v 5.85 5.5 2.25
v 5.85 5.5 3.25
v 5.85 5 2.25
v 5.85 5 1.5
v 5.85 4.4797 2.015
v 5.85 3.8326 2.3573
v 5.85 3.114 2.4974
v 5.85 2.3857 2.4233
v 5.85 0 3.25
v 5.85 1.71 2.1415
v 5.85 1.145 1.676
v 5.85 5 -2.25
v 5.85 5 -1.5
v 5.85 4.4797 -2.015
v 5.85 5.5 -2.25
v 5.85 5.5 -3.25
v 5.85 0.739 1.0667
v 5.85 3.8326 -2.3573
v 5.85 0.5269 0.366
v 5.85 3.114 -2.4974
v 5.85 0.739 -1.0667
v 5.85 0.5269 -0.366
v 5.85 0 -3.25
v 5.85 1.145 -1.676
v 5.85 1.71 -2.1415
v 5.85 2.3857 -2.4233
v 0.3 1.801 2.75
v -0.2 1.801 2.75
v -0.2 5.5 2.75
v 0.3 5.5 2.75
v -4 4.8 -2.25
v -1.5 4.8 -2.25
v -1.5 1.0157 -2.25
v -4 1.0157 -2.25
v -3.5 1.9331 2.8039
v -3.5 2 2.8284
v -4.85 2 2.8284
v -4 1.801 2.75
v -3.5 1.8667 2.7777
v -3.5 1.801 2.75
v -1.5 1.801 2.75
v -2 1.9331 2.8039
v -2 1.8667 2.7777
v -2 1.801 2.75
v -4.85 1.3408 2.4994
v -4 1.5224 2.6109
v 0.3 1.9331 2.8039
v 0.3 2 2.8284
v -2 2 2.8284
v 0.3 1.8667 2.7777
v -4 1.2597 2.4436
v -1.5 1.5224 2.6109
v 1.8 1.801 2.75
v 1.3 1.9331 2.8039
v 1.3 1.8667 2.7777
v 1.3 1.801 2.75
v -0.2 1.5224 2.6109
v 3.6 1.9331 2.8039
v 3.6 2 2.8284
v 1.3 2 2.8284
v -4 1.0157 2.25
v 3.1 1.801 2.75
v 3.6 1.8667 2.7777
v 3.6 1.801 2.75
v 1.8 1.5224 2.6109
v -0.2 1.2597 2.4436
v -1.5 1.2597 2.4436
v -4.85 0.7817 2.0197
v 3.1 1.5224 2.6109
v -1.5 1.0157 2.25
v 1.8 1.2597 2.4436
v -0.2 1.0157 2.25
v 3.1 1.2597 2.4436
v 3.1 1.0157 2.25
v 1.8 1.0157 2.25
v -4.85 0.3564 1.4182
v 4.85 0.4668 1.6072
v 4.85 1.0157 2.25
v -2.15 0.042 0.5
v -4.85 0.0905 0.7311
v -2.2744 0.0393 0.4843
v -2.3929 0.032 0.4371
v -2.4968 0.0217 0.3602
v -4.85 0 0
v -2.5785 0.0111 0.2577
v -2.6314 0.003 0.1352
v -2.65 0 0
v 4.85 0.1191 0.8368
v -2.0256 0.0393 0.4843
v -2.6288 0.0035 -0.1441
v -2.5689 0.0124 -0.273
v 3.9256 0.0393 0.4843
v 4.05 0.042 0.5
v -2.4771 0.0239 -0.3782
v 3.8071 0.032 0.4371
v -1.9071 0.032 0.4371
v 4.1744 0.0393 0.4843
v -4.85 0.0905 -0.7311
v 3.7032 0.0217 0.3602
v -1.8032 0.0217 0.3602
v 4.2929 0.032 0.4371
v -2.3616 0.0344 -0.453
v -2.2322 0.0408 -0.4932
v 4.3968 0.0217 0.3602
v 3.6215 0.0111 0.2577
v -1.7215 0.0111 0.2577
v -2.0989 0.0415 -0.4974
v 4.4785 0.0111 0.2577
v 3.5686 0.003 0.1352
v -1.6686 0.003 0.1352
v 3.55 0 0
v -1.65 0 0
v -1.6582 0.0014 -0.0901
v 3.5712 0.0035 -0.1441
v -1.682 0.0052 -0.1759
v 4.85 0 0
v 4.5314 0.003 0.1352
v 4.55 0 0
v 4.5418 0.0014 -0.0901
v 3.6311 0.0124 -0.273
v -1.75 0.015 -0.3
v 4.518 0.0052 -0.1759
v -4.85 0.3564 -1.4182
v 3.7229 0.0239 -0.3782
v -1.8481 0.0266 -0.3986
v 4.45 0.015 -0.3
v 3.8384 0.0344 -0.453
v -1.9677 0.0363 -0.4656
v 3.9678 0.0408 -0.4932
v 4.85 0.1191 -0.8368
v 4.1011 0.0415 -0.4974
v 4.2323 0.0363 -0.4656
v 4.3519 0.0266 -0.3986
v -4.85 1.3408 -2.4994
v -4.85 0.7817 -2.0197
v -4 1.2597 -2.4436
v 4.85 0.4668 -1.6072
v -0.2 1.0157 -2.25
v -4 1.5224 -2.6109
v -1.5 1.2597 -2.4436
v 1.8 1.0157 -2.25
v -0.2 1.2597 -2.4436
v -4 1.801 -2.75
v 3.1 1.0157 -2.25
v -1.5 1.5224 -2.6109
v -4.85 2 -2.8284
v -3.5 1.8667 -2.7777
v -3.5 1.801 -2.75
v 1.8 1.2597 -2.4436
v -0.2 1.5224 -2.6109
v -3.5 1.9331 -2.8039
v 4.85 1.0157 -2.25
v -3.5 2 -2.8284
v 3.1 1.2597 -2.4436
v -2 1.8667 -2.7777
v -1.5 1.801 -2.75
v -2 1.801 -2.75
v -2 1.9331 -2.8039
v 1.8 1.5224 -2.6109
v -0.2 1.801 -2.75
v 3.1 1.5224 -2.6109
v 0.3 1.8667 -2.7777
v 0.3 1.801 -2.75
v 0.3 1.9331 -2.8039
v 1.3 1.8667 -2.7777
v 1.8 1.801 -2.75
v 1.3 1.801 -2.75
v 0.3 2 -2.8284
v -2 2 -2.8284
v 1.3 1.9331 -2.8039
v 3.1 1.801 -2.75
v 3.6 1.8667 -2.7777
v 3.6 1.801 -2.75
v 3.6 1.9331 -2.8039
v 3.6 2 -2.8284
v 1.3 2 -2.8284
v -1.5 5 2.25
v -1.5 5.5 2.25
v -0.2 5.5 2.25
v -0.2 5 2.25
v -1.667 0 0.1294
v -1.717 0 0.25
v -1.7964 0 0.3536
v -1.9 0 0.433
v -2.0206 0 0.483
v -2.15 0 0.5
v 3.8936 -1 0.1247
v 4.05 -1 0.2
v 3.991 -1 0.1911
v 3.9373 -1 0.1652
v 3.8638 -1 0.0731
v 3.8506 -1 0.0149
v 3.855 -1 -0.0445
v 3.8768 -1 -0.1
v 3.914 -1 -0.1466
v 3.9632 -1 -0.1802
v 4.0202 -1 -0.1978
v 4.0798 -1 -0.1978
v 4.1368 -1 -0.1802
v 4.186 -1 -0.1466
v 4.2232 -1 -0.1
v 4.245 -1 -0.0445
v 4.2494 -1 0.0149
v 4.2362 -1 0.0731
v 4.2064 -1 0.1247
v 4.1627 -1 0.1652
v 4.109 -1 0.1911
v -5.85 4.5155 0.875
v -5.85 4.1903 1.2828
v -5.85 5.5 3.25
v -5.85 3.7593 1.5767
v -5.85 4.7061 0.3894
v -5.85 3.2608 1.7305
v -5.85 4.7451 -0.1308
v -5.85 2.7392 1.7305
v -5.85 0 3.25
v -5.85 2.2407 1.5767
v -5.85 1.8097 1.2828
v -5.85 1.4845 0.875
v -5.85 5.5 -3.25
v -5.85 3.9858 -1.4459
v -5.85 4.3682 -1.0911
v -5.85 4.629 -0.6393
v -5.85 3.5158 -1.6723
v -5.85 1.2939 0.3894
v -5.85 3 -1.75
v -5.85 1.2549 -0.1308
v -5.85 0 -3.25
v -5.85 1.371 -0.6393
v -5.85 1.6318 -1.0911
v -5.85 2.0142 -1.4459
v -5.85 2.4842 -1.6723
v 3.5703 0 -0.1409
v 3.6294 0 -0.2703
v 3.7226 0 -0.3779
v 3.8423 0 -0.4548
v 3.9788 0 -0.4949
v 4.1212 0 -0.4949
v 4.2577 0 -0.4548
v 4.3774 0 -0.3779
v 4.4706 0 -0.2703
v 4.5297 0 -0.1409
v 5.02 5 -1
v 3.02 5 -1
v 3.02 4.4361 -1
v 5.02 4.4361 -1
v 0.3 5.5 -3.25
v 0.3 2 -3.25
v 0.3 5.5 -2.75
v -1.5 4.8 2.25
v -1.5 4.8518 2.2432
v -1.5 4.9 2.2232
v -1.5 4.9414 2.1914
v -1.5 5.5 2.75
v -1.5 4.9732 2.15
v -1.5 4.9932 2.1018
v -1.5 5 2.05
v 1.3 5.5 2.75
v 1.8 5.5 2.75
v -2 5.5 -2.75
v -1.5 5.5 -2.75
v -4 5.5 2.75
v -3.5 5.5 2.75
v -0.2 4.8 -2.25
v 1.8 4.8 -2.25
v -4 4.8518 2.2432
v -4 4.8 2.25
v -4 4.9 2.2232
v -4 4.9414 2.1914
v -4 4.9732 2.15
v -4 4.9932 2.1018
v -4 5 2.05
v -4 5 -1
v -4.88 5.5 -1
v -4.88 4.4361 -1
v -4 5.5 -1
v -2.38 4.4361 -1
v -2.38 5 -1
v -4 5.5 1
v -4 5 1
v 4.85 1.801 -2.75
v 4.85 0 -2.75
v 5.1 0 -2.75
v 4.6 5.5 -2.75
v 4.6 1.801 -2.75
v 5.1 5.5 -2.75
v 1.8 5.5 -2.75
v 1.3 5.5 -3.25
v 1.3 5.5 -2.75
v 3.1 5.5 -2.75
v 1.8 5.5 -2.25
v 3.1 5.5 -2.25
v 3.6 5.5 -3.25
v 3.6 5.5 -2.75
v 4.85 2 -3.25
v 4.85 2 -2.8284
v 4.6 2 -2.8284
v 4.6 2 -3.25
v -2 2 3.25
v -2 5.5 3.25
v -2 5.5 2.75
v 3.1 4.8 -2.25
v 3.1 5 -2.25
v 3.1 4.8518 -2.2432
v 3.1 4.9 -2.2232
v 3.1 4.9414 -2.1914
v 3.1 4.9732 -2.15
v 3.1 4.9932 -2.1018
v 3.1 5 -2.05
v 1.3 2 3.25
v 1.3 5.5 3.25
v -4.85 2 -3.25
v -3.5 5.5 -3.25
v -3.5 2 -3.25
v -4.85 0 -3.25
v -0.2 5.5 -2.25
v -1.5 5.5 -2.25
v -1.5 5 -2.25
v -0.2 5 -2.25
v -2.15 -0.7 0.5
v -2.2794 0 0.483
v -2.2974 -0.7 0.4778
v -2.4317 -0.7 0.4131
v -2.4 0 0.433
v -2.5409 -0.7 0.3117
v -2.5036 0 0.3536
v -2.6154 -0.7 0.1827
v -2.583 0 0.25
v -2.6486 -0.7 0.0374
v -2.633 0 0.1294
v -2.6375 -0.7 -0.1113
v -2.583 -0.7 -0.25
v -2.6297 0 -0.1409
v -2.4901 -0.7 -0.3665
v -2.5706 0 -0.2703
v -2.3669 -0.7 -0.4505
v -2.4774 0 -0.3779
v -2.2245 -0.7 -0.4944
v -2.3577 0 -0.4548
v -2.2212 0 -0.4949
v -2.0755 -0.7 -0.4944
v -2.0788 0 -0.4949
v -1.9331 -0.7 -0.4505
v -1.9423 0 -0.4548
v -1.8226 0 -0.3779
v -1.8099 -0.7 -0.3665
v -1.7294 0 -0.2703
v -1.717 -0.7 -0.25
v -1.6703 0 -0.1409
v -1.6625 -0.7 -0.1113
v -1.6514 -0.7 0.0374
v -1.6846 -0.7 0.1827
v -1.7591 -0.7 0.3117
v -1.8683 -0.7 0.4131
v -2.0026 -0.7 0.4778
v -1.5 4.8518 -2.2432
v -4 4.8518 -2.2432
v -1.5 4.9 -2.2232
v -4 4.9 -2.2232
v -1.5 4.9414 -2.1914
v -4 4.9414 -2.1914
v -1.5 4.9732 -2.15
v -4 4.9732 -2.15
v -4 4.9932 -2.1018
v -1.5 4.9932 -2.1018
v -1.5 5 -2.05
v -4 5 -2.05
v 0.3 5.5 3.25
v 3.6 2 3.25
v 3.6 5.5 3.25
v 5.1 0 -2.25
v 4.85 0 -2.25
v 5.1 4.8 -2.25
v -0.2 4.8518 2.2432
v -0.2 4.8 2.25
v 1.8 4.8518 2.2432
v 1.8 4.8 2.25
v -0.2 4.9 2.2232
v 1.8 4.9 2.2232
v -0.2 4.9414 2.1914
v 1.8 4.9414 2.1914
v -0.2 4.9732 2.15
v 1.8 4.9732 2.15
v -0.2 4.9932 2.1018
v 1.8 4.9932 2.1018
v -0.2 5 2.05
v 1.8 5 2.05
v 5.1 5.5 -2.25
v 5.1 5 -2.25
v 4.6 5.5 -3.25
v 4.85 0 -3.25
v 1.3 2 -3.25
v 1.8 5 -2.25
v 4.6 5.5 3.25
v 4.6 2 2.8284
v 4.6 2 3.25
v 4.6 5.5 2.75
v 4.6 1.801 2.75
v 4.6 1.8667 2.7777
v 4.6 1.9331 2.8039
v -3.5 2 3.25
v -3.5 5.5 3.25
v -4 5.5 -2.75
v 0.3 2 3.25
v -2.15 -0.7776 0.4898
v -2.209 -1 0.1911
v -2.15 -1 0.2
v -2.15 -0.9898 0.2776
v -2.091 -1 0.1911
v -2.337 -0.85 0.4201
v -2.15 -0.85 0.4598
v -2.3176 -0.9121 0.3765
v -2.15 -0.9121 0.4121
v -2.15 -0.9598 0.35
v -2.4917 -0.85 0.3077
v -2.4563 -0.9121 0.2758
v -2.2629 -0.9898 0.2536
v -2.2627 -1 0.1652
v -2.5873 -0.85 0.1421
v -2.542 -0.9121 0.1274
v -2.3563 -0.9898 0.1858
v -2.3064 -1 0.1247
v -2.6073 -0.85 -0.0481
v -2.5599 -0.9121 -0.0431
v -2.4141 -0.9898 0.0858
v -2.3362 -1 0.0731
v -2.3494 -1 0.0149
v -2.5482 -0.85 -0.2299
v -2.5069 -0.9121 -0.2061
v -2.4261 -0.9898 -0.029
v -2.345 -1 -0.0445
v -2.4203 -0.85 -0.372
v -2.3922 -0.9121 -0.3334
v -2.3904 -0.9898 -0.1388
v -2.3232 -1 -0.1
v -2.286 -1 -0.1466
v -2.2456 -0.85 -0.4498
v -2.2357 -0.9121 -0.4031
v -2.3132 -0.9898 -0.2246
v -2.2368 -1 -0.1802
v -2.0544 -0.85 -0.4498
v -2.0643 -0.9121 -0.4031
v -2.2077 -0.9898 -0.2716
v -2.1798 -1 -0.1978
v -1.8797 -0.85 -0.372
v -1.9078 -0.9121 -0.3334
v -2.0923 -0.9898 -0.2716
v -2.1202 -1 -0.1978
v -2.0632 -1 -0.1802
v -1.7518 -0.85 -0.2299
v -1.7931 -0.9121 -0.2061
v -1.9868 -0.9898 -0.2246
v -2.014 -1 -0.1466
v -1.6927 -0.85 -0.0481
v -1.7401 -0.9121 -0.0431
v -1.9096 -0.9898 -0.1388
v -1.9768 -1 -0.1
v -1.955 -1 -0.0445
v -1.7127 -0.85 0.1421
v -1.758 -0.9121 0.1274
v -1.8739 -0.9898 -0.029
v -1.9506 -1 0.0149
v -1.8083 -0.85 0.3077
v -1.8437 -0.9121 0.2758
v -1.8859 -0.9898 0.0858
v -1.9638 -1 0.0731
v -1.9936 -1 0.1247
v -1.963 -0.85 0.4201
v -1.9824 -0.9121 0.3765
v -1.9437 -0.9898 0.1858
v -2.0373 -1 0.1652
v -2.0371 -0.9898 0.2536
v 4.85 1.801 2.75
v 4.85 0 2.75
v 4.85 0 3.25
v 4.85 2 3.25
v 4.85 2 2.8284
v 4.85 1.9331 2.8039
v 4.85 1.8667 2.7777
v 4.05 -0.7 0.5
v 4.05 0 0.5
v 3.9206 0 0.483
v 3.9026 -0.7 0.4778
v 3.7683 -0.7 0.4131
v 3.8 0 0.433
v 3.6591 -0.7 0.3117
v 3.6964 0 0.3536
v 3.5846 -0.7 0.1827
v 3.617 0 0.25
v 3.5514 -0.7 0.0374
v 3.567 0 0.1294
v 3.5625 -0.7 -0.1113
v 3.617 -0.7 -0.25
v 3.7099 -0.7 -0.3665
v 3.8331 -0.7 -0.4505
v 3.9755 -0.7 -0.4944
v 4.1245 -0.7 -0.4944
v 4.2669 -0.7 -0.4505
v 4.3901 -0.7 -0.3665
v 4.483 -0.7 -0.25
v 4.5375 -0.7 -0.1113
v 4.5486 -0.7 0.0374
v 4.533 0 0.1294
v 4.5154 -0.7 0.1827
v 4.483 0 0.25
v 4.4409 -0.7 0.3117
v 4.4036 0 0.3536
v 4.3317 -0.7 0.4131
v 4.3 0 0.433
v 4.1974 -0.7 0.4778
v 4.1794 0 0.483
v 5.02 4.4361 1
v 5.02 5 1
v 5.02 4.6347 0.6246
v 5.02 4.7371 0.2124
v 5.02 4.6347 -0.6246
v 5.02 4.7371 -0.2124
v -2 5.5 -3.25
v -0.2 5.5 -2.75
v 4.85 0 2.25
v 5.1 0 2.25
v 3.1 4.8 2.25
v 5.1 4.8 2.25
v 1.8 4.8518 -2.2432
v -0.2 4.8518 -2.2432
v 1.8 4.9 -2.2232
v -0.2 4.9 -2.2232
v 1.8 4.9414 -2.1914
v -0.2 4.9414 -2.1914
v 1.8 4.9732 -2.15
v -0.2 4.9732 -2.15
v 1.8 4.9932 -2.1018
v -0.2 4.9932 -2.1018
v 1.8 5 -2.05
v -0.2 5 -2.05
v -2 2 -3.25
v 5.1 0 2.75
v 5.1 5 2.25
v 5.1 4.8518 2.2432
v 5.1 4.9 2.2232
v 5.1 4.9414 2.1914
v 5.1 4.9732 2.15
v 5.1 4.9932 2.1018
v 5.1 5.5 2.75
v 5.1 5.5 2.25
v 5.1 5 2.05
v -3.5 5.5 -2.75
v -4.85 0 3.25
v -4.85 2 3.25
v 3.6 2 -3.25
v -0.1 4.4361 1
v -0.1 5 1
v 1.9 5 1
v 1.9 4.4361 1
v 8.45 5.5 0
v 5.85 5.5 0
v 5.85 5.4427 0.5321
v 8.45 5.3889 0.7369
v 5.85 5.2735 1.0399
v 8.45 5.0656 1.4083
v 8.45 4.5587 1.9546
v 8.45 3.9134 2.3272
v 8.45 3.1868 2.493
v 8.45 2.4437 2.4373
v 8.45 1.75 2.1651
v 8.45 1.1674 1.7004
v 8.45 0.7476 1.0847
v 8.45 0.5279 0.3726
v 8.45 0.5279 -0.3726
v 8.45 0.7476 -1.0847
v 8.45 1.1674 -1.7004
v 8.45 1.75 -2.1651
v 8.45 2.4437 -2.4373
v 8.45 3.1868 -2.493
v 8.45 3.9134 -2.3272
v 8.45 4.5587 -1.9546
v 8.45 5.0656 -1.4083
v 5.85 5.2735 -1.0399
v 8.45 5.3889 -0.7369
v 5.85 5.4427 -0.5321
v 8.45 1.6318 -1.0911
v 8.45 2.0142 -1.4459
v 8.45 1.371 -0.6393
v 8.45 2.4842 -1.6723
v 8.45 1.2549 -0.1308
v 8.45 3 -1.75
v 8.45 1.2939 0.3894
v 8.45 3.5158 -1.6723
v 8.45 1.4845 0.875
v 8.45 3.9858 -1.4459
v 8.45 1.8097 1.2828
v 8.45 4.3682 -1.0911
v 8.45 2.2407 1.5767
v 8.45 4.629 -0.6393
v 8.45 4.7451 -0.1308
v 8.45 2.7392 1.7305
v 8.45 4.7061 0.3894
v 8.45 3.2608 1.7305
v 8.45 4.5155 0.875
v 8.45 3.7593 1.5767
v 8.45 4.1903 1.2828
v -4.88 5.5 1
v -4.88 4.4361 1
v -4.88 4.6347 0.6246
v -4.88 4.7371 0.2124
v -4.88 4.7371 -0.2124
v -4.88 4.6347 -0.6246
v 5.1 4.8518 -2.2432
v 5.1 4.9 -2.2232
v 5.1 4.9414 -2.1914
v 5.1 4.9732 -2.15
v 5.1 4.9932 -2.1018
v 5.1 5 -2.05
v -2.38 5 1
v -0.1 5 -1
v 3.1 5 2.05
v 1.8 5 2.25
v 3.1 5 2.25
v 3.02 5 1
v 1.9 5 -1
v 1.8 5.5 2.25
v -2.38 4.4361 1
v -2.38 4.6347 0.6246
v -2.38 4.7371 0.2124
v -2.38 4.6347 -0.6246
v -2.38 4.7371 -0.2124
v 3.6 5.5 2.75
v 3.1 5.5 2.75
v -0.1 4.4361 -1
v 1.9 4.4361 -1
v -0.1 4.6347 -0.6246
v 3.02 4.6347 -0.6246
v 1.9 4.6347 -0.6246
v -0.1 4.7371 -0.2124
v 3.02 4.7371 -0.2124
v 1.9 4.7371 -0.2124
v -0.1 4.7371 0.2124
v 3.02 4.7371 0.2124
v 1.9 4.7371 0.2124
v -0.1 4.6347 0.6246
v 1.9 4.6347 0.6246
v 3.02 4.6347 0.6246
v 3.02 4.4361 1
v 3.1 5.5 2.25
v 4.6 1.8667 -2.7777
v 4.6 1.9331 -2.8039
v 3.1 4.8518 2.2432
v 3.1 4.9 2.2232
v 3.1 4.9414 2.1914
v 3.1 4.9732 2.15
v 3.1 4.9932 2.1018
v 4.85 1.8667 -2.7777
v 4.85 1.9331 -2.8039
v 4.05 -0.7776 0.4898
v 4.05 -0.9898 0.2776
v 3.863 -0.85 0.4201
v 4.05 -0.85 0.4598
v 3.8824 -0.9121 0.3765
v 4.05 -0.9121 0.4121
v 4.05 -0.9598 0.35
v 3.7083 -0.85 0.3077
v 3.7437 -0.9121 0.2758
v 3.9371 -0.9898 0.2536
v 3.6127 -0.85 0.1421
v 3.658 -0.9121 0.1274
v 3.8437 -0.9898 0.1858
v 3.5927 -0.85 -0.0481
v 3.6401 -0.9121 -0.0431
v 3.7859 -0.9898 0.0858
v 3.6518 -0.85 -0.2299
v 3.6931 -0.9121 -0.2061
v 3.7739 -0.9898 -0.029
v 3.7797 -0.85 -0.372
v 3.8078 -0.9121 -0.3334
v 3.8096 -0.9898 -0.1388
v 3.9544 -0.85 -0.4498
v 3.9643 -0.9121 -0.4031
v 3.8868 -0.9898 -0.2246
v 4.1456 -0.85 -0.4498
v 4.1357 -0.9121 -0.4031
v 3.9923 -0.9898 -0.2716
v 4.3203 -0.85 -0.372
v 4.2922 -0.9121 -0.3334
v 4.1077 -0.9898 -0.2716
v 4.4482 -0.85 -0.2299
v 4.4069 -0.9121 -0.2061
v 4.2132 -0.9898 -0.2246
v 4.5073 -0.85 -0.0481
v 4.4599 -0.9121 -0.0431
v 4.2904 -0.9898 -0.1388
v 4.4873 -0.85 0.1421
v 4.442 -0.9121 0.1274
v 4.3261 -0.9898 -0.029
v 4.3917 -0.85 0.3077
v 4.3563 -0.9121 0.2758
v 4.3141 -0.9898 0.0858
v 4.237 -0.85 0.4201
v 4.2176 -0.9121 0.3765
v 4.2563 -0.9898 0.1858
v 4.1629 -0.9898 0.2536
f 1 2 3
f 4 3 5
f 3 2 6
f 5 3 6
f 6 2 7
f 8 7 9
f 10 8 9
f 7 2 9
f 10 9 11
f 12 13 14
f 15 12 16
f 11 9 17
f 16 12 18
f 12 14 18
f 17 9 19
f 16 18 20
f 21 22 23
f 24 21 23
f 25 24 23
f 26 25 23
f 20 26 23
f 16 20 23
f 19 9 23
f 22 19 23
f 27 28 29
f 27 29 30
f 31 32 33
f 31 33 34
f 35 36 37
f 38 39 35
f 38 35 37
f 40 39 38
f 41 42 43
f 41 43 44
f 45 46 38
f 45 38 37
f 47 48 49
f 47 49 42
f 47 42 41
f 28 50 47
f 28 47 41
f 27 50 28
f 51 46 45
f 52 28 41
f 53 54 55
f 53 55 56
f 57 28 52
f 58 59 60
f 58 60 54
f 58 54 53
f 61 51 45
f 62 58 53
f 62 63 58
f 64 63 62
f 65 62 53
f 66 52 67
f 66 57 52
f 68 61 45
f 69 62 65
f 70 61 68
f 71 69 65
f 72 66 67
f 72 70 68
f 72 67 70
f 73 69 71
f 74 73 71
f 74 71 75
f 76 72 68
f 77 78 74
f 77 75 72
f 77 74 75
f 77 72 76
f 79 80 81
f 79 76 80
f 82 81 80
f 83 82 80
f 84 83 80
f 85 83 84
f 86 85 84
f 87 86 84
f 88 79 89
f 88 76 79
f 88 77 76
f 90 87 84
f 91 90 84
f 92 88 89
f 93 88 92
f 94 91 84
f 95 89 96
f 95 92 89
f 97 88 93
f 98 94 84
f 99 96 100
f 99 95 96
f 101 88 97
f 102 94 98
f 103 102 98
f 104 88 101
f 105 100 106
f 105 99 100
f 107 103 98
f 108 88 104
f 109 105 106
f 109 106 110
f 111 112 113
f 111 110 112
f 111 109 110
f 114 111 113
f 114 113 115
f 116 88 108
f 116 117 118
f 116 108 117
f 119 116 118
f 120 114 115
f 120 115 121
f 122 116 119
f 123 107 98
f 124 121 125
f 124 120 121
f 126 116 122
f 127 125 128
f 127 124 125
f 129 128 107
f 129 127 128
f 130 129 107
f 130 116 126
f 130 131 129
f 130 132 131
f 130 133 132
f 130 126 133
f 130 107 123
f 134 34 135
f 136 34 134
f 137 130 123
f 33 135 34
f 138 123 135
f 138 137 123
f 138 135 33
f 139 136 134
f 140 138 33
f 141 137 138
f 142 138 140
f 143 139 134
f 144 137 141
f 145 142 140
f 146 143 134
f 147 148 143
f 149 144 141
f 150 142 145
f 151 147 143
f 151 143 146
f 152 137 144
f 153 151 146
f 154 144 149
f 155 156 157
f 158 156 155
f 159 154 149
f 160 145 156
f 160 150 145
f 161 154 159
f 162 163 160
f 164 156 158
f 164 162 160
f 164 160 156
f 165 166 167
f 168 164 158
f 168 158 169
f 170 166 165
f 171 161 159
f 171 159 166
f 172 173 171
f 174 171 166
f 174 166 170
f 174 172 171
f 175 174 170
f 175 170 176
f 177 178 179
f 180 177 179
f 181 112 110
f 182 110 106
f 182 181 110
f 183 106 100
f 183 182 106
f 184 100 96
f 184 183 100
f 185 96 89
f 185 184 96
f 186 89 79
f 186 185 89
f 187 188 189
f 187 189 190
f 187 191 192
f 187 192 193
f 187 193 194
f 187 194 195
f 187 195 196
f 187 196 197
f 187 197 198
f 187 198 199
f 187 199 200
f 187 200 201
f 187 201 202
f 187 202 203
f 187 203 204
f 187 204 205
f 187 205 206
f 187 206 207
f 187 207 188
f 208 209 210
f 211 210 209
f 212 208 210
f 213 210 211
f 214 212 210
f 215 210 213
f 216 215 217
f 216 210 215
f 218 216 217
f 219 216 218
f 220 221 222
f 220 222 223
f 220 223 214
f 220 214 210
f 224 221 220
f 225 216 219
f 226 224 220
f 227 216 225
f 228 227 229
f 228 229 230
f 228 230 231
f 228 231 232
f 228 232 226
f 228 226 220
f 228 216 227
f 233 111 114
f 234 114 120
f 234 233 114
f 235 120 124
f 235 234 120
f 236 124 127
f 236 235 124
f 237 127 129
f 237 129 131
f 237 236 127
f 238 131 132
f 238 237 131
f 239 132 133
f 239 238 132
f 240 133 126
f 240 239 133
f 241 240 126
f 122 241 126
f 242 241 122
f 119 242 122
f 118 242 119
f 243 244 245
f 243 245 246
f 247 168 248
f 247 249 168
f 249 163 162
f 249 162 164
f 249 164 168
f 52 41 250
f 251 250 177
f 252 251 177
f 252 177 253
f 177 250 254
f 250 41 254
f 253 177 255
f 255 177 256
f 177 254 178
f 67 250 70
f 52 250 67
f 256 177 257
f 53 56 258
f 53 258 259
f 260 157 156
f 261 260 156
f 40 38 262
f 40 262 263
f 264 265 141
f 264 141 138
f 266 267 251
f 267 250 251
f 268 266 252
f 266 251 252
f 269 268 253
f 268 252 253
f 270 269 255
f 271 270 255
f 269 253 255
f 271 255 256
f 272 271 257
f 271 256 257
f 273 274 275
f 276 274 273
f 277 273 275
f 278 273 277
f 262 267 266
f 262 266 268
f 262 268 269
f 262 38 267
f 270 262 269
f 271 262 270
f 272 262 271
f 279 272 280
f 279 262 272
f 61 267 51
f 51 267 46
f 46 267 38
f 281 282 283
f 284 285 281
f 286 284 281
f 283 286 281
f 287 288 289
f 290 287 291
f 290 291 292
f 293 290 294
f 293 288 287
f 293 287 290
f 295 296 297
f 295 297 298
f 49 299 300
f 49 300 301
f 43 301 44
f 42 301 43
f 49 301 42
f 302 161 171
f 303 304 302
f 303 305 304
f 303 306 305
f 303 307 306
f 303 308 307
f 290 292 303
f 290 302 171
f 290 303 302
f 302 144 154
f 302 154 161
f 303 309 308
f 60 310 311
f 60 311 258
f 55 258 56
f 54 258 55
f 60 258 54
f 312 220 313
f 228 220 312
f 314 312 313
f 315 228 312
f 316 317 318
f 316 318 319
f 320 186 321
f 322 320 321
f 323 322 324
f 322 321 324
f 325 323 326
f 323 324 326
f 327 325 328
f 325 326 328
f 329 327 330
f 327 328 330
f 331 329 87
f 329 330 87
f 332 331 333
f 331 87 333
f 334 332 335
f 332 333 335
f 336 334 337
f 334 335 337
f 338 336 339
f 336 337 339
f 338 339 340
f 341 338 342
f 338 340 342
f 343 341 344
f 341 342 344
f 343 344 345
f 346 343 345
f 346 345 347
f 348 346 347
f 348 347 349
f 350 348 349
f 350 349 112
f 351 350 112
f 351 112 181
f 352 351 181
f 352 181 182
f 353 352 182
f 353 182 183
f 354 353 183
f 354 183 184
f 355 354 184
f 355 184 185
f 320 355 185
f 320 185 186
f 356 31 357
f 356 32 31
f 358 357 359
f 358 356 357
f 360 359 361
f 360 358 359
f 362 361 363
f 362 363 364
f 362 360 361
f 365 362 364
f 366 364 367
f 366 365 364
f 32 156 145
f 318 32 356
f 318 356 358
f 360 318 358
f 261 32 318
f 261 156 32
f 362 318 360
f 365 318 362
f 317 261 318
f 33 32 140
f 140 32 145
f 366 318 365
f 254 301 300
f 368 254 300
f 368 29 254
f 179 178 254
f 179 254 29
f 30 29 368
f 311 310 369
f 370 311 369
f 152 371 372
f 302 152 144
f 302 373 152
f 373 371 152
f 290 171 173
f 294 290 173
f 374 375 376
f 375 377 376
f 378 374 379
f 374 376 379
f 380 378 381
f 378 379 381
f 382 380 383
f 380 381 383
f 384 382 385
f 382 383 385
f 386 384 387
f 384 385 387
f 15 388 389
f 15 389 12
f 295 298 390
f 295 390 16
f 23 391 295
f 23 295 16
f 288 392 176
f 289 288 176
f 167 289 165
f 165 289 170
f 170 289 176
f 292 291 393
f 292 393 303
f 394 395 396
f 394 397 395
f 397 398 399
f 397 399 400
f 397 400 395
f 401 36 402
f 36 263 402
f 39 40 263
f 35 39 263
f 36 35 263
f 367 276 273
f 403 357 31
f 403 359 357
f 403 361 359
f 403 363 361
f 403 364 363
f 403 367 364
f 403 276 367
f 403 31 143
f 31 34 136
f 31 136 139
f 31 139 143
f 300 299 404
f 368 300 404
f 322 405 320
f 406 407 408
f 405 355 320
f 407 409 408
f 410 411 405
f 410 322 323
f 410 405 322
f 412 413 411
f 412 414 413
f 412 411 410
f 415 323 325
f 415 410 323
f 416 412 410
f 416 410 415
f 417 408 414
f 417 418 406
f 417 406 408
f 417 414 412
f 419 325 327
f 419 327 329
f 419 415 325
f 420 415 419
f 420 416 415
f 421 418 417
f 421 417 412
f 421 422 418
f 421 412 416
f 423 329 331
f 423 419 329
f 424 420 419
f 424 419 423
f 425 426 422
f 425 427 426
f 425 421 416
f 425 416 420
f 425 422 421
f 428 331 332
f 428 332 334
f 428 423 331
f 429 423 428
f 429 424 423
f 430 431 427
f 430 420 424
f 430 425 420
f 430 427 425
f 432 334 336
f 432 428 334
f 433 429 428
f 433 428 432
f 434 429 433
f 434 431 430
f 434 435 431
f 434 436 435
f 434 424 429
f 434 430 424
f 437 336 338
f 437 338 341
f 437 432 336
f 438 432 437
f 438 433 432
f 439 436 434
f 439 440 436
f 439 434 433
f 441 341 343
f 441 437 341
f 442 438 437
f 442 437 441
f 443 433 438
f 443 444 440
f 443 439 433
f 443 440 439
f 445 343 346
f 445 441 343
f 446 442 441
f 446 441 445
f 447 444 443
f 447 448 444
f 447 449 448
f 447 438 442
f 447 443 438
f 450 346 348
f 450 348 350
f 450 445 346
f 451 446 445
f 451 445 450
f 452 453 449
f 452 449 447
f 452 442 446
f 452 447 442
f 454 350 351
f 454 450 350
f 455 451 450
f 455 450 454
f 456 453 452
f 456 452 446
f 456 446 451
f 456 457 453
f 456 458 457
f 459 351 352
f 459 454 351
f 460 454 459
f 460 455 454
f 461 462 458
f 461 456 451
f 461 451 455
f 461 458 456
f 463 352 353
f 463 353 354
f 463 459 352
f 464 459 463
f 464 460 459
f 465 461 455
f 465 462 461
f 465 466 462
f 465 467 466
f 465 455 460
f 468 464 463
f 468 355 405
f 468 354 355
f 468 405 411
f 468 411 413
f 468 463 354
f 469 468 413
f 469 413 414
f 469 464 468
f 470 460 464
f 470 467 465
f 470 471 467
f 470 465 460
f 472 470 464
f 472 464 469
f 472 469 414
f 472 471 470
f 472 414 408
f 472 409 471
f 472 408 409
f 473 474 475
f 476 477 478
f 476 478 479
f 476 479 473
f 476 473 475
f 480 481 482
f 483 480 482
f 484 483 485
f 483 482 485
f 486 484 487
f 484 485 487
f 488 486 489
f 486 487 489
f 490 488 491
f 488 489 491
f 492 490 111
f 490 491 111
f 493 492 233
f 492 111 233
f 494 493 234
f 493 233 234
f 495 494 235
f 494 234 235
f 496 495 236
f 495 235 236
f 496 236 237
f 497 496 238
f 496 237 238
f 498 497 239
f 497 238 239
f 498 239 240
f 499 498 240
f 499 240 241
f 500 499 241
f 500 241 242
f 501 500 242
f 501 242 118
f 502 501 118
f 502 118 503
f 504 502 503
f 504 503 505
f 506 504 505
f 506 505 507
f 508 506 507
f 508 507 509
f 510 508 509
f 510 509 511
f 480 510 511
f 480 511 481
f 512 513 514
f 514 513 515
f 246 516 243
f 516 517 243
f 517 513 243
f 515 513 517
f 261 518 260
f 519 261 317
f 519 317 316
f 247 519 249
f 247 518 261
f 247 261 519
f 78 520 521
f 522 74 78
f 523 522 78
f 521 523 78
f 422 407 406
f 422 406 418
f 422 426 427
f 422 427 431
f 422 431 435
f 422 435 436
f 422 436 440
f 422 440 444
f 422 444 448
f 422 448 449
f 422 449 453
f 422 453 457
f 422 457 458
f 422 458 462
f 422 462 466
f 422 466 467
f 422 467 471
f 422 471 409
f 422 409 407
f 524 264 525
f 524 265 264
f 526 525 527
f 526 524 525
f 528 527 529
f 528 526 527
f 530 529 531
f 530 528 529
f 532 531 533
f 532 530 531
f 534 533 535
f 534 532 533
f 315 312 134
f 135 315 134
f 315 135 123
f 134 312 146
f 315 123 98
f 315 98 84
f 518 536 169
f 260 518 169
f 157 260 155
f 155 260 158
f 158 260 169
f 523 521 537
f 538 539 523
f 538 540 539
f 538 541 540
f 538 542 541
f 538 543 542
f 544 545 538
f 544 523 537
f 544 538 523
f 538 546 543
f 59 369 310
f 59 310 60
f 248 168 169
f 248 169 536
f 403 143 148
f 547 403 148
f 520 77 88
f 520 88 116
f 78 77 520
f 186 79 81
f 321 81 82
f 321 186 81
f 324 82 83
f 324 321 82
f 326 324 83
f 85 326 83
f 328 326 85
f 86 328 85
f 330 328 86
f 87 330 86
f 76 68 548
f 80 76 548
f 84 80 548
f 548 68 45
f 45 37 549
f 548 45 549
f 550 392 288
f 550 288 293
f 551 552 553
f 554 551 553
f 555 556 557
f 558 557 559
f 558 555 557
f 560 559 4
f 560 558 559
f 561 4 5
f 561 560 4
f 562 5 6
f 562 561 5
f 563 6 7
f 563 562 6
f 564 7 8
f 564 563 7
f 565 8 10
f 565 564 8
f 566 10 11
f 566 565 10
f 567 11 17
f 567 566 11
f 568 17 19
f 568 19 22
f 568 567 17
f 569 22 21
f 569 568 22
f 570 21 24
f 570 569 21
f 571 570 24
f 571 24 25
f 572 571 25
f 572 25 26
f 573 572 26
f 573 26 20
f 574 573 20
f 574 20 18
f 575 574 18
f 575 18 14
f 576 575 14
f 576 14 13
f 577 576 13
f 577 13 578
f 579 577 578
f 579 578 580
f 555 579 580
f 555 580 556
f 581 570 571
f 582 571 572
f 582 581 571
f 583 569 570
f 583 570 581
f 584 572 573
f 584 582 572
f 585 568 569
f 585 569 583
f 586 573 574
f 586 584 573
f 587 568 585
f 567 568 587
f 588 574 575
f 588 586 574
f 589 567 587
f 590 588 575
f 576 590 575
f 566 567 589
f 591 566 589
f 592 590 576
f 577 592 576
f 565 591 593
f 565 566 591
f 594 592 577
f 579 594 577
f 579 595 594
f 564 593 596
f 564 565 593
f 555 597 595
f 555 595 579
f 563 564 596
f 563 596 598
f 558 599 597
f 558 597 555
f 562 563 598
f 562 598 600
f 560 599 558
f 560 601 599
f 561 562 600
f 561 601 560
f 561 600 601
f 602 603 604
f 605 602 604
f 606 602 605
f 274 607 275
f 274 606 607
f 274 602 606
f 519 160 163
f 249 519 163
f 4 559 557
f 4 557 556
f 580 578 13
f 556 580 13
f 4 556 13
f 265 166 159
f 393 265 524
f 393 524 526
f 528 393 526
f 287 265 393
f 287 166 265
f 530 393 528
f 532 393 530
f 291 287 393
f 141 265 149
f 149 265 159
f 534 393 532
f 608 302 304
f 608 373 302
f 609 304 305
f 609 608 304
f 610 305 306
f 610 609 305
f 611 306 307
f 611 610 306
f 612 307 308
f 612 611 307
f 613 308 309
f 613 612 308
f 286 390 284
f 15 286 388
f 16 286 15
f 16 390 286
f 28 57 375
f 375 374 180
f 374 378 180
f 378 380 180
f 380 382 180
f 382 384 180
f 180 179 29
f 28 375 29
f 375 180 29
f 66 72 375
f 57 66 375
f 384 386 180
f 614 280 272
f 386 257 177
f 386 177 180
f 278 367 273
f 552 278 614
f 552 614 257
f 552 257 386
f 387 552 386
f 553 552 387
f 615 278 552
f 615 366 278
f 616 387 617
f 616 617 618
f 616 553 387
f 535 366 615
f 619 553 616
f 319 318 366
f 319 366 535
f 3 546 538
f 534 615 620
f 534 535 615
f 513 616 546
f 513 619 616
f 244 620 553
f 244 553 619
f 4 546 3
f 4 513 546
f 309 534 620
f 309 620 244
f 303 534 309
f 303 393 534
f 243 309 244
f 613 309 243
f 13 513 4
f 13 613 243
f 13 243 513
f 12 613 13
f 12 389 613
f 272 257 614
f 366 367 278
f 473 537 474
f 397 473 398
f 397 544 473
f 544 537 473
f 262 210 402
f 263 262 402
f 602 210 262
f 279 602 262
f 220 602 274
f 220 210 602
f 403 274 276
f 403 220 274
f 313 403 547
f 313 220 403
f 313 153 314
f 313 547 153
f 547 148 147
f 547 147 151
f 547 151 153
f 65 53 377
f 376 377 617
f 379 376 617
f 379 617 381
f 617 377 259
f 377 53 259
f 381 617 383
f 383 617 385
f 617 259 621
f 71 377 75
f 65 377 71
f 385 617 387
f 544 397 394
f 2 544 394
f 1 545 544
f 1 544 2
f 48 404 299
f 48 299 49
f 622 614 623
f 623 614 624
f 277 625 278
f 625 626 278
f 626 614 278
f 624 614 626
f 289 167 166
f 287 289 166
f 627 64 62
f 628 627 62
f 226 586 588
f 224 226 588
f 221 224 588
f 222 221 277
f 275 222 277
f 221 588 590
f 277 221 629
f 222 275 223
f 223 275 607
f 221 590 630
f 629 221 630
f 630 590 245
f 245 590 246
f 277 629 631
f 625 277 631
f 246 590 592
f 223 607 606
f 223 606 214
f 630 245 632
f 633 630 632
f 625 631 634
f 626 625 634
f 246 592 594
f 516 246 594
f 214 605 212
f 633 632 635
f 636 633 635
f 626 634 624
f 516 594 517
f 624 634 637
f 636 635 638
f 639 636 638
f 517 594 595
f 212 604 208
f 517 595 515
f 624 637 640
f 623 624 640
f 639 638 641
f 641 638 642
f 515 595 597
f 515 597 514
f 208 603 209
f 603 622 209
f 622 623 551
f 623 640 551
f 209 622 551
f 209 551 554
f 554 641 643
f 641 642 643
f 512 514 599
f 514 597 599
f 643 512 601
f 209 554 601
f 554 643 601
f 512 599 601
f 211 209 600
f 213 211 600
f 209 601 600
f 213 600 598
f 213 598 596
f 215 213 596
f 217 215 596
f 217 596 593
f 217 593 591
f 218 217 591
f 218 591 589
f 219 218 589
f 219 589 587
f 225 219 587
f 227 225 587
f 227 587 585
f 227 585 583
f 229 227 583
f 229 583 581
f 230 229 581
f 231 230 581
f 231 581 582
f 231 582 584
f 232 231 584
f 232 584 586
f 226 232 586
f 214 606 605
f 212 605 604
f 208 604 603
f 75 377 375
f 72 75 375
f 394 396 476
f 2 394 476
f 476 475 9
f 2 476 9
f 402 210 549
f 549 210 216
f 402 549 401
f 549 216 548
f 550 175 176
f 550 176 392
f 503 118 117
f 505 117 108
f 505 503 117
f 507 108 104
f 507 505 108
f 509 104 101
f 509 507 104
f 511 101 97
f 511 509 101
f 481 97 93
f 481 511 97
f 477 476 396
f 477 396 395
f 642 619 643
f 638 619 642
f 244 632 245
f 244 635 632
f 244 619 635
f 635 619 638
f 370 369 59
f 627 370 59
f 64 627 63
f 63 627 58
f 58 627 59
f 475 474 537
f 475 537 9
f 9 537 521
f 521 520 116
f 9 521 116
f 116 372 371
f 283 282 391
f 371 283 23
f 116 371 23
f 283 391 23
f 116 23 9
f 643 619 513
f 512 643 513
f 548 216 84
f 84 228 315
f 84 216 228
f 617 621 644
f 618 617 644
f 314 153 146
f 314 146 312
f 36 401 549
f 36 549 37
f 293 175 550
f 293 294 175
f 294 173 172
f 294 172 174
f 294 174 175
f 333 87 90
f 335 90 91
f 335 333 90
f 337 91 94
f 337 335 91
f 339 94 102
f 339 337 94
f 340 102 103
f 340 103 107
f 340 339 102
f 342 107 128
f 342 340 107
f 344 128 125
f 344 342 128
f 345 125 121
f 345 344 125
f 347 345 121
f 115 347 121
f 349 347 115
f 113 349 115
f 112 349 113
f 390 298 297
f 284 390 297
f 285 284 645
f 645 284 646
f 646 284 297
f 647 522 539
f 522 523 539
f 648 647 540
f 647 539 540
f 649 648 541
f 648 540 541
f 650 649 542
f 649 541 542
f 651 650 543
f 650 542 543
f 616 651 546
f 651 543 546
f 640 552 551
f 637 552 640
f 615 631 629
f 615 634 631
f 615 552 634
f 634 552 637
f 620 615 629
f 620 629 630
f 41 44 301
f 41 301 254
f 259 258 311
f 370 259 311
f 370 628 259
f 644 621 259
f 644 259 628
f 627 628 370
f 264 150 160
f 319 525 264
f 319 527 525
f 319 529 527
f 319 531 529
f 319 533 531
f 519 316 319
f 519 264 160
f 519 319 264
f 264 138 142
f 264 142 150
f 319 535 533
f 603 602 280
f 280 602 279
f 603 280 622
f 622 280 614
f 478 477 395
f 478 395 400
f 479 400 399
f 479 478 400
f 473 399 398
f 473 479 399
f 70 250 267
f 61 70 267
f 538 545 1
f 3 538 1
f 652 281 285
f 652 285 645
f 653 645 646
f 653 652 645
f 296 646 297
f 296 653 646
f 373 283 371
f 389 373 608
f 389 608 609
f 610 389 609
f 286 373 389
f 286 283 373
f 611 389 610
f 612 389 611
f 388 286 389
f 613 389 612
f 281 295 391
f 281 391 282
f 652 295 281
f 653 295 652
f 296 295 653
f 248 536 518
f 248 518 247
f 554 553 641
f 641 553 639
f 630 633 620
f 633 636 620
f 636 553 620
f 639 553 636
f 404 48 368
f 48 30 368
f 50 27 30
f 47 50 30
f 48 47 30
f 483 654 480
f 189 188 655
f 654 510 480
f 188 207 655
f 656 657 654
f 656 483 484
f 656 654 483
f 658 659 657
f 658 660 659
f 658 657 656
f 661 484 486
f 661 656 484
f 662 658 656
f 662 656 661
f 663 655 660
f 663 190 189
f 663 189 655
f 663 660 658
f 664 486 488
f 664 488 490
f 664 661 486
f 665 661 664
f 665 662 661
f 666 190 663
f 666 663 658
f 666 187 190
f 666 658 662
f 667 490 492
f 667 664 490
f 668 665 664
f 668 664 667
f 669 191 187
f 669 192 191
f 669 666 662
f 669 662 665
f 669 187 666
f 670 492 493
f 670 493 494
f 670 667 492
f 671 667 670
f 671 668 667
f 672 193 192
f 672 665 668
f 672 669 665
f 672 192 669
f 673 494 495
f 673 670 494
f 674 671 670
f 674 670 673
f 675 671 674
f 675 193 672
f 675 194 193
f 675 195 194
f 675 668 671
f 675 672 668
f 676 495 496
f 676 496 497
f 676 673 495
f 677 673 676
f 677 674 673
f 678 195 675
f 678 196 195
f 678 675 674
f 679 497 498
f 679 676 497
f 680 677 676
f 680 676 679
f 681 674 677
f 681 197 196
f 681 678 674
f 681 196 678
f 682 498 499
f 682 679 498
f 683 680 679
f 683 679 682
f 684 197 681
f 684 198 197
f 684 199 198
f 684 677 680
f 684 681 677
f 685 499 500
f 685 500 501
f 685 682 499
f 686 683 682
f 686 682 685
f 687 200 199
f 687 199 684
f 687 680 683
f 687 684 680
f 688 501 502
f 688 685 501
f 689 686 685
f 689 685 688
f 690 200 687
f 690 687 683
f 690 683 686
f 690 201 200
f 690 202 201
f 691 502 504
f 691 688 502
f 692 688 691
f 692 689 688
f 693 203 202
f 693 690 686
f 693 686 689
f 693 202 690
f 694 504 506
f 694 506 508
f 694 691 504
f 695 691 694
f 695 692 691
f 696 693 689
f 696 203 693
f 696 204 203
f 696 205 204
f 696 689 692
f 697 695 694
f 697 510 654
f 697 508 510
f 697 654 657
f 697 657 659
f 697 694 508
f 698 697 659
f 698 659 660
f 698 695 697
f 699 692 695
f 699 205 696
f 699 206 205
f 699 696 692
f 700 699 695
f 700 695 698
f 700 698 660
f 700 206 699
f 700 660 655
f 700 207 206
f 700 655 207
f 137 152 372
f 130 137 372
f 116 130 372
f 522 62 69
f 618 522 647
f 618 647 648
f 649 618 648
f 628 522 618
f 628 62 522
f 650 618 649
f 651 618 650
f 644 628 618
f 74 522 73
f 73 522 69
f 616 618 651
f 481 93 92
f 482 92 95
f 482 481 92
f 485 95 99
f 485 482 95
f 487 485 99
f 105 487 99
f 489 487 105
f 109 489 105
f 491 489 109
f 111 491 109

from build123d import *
from build123d.topology import SkipClean

# Parameters (mm, degrees)
SKETCH1_W                            = 11.7
SKETCH1_H                            = 6.5
BOSS_EXTRUDE1_DEPTH                  = 5.5
SKETCH2_R                            = 1.75
CUT_EXTRUDE1_DEPTH                   = 15.5
BOSS_EXTRUDE2_START                  = 2.6
SKETCH3_R                            = 2.5
SKETCH3_R_2                          = 1.75
BOSS_EXTRUDE2_DEPTH                  = 2.6
CUT_EXTRUDE2_START                   = -1
CUT_EXTRUDE2_DEPTH                   = 9.7
CUT_EXTRUDE3_DEPTH                   = 10
SKETCH6_W                            = 2.5
SKETCH6_H                            = 2
SKETCH6_W_2                          = 2
CUT_EXTRUDE4_DEPTH                   = 2
SKETCH7_W                            = 9.85
SKETCH7_H                            = 4.5
CUT_EXTRUDE5_DEPTH                   = 0.5
FILLET1_R                            = 0.2
SKETCH8_R                            = 0.5
BOSS_EXTRUDE3_DEPTH                  = 1
BOSS_EXTRUDE3_DIRECTION_2_REACH      = 12.593
BOSS_EXTRUDE3_DIRECTION_2_END_RADIUS = 3
FILLET2_R                            = 0.3


with BuildPart() as part:
    # Sketch1 → Boss-Extrude1 (new body)
    with BuildSketch(Plane(origin=(0, 0, 0), x_dir=(1, 0, 0), z_dir=(0, 1, 0))):
        Rectangle(SKETCH1_W, SKETCH1_H)
    extrude(amount=BOSS_EXTRUDE1_DEPTH)

    # Sketch2 → Cut-Extrude1 (cut)
    with BuildSketch(Plane(origin=(5.85, 0, 0), x_dir=(0, 0, -1), z_dir=(1, 0, 0))):
        with Locations((0, 3)):
            Circle(SKETCH2_R)
    extrude(amount=-CUT_EXTRUDE1_DEPTH, mode=Mode.SUBTRACT)

    # Sketch3 → Boss-Extrude2 (add)
    with BuildSketch(Plane(origin=(5.85, 0, 0), x_dir=(0, 0, -1), z_dir=(1, 0, 0)).offset(BOSS_EXTRUDE2_START)):
        with Locations(Location((0, 3, 0), (0, 0, 90))):
            Circle(SKETCH3_R)
        with Locations((0, 3)):
            Circle(SKETCH3_R_2, mode=Mode.SUBTRACT)
    extrude(amount=-BOSS_EXTRUDE2_DEPTH)

    # Sketch4 → Cut-Extrude2 (cut)
    with BuildSketch(Plane(origin=(5.85, 0, 0), x_dir=(0, 0, -1), z_dir=(1, 0, 0)).offset(CUT_EXTRUDE2_START)):
        with BuildLine():
            Line((-4.687033743, 2), (-2.828427125, 2))
            ThreePointArc((-2.828427125, 2), (0, 0), (2.828427125, 2))
            Line((2.828427125, 2), (5.329187563, 2))
            Line((5.329187563, 2), (5.329187563, -1.490759496))
            Line((5.329187563, -1.490759496), (-4.687033743, -1.490759496))
            Line((-4.687033743, -1.490759496), (-4.687033743, 2))
        make_face()
    extrude(amount=-CUT_EXTRUDE2_DEPTH, mode=Mode.SUBTRACT)

    # Sketch5 → Cut-Extrude3 (cut)
    with BuildSketch(Plane(origin=(0, 5.5, 0), x_dir=(1, 0, 0), z_dir=(0, 1, 0))):
        Polygon((-3.5, 4.45), (-2, 4.45), (-2, 2.75), (-1.5, 2.75), (-1.5, 2.25), (-4, 2.25), (-4, 2.75), (-3.5, 2.75), align=None)
        Polygon((0.3, 4.45), (1.3, 4.45), (1.3, 2.75), (1.8, 2.75), (1.8, 2.25), (-0.2, 2.25), (-0.2, 2.75), (0.3, 2.75), align=None)
        Polygon((3.6, 4.45), (4.6, 4.45), (4.6, 2.75), (5.1, 2.75), (5.1, 2.25), (3.1, 2.25), (3.1, 2.75), (3.6, 2.75), align=None)
        Polygon((1.3, -2.75), (1.8, -2.75), (1.8, -2.25), (-0.2, -2.25), (-0.2, -2.75), (0.3, -2.75), (0.3, -4.45), (1.3, -4.45), align=None)
        Polygon((-2, -2.75), (-1.5, -2.75), (-1.5, -2.25), (-4, -2.25), (-4, -2.75), (-3.5, -2.75), (-3.5, -4.45), (-2, -4.45), align=None)
        Polygon((5.1, -2.25), (5.1, -2.75), (4.6, -2.75), (4.6, -4.45), (3.6, -4.45), (3.6, -2.75), (3.1, -2.75), (3.1, -2.25), align=None)
    extrude(amount=-CUT_EXTRUDE3_DEPTH, mode=Mode.SUBTRACT)

    # Sketch6 → Cut-Extrude4 (cut)
    with BuildSketch(Plane(origin=(0, 5.5, 0), x_dir=(1, 0, 0), z_dir=(0, 1, 0))):
        with Locations((-3.63, 0)):
            Rectangle(SKETCH6_W, SKETCH6_H)
        with Locations((0.9, 0)):
            Rectangle(SKETCH6_W_2, SKETCH6_H)
        with Locations((4.02, 0)):
            Rectangle(SKETCH6_W_2, SKETCH6_H)
    extrude(amount=-CUT_EXTRUDE4_DEPTH, mode=Mode.SUBTRACT)

    # Sketch7 → Cut-Extrude5 (cut)
    with BuildSketch(Plane(origin=(0, 5.5, 0), x_dir=(1, 0, 0), z_dir=(0, 1, 0))):
        with Locations((0.925, 0)):
            Rectangle(SKETCH7_W, SKETCH7_H)
    extrude(amount=-CUT_EXTRUDE5_DEPTH, mode=Mode.SUBTRACT)

    # Fillet1
    fillet1_edges = [part.edges().sort_by_distance(p)[0] for p in [
        (-2.75, 5, -2.25),
        (0.8, 5, -2.25),
        (4.1, 5, 2.25),
        (0.8, 5, 2.25),
        (-2.75, 5, 2.25),
        (4.1, 5, -2.25),
    ]]
    fillet(fillet1_edges, radius=FILLET1_R)

    # Sketch8 → Boss-Extrude3 (add)
    with BuildSketch(Plane.XZ):
        with Locations(Location((4.05, 0, 0), (0, 0, 90))):
            Circle(SKETCH8_R)
        with Locations(Location((-2.15, 0, 0), (0, 0, 90))):
            Circle(SKETCH8_R)
    extrude(amount=BOSS_EXTRUDE3_DEPTH)

    # Boss-Extrude3 direction 2: up to this cylinder (the profile starts outside it)
    with SkipClean():  # the faces are left unmerged after this step: merging them gives an invalid solid
        boss_extrude3_direction_2_end = Plane(origin=(0.95, 3, 0), z_dir=(1, 0, 0)) * Cylinder(BOSS_EXTRUDE3_DIRECTION_2_END_RADIUS, 38.386, mode=Mode.PRIVATE)
        # Sketch8 → Boss-Extrude3 direction 2 (add, up to the surface)
        with BuildSketch(Plane.XZ, mode=Mode.PRIVATE) as boss_extrude3_direction_2_sk1:
            with Locations(Location((4.05, 0, 0), (0, 0, 90))):
                Circle(SKETCH8_R)
        boss_extrude3_direction_2_tool1 = extrude(boss_extrude3_direction_2_sk1.sketch, amount=-BOSS_EXTRUDE3_DIRECTION_2_REACH, mode=Mode.PRIVATE) - boss_extrude3_direction_2_end
        add(boss_extrude3_direction_2_tool1.solids().sort_by_distance((4.05, 0, 0))[0])
        add(boss_extrude3_direction_2_tool1.solids().sort_by_distance((4.05, 0, 0))[1])
        # Sketch8 → Boss-Extrude3 direction 2 (add, up to the surface)
        with BuildSketch(Plane.XZ, mode=Mode.PRIVATE) as boss_extrude3_direction_2_sk2:
            with Locations(Location((-2.15, 0, 0), (0, 0, 90))):
                Circle(SKETCH8_R)
        boss_extrude3_direction_2_tool2 = extrude(boss_extrude3_direction_2_sk2.sketch, amount=-BOSS_EXTRUDE3_DIRECTION_2_REACH, mode=Mode.PRIVATE) - boss_extrude3_direction_2_end
        add(boss_extrude3_direction_2_tool2.solids().sort_by_distance((-2.15, 0, 0))[0])
        add(boss_extrude3_direction_2_tool2.solids().sort_by_distance((-2.15, 0, 0))[1])

    # Fillet2
    fillet2_edges = [part.edges().sort_by_distance(p)[0] for p in [
        (4.05, -1, -0.5),
        (-2.15, -1, -0.5),
    ]]
    fillet(fillet2_edges, radius=FILLET2_R)


solid = part.part
